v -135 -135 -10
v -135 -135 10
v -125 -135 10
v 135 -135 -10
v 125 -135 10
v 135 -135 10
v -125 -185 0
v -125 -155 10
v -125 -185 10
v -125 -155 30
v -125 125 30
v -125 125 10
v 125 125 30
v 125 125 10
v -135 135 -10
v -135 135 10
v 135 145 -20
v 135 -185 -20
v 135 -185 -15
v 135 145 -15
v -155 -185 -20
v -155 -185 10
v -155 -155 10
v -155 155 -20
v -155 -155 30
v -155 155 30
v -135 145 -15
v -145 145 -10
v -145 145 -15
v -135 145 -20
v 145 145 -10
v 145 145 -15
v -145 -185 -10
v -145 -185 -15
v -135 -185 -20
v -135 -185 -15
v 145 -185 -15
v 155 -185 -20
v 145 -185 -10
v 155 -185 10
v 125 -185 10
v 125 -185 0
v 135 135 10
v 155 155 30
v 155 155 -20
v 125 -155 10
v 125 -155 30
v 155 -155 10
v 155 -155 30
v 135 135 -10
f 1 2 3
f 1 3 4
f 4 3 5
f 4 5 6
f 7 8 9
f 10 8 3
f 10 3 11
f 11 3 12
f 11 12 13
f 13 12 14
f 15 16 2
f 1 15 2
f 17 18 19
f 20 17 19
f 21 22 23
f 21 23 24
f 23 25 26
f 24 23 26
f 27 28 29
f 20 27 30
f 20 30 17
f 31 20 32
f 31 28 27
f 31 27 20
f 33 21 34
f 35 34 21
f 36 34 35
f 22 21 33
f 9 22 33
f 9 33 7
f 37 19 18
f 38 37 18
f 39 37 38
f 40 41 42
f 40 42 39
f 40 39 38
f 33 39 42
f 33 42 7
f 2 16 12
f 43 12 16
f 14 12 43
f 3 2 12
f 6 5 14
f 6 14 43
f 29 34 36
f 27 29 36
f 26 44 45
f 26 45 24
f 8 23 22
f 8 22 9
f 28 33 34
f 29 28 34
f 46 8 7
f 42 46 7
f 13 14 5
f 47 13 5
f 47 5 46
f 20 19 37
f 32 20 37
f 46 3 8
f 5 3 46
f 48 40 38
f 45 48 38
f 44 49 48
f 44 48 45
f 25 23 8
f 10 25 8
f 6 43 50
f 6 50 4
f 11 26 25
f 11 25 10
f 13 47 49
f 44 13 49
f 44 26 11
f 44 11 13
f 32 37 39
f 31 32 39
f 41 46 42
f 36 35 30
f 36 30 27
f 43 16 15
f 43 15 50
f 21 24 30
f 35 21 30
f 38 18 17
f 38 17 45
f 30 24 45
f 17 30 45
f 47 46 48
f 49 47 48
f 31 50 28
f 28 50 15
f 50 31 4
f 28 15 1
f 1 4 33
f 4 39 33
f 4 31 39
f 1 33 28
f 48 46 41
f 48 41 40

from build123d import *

# Parameters (mm, degrees)
F1_DEPTH  = 30
F2_DEPTH  = 10
F0_W      = 250
F0_H      = 250
F0_H_2    = 30
F3_DEPTH  = 10
F6_DEPTH  = 250
F7_W      = 270
F7_H      = 270
F8_DEPTH  = 10
F9_DEPTH  = 20
F10_W     = 270
F10_H     = 5
F11_DEPTH = 330


with BuildPart() as f1:
    # F0 (on Top) → F1 (new body)
    with BuildSketch(Plane.XY):
        Polygon((125, -155), (155, -155), (155, 155), (-155, 155), (-155, -155), (-125, -155), (-125, -125), (-125, 125), (125, 125), (125, -125), align=None)
    extrude(amount=F1_DEPTH)

    # F0 (on Top) → F2 (join)
    with BuildSketch(Plane.XY):
        Polygon((155, -185), (155, -155), (125, -155), (-125, -155), (-155, -155), (-155, -185), align=None)
        Polygon((125, -155), (155, -155), (155, 155), (-155, 155), (-155, -155), (-125, -155), (-125, -125), (-125, 125), (125, 125), (125, -125), align=None)
    extrude(amount=F2_DEPTH)

    # F0 (on Top) → F3 (join)
    with BuildSketch(Plane.XY):
        Rectangle(F0_W, F0_H)
        Polygon((125, -155), (155, -155), (155, 155), (-155, 155), (-155, -155), (-125, -155), (-125, -125), (-125, 125), (125, 125), (125, -125), align=None)
        Polygon((155, -185), (155, -155), (125, -155), (-125, -155), (-155, -155), (-155, -185), align=None)
        with Locations((0, -140)):
            Rectangle(F0_W, F0_H_2)
    extrude(amount=F3_DEPTH)

    # F5 (on offset) → F6 (cut)
    with BuildSketch(Plane(origin=(-125, 0, 0), x_dir=(0, -1, 0), z_dir=(-1, 0, 0))):
        Polygon((155, 10), (185, 0), (185, 10), align=None)
    extrude(amount=-F6_DEPTH, mode=Mode.SUBTRACT)

    # F7 (on face) → F8 (cut)
    with BuildSketch(Plane(origin=(0, 0, 0), x_dir=(1, 0, 0), z_dir=(0, 0, -1))):
        Rectangle(F7_W, F7_H)
    extrude(amount=-F8_DEPTH, mode=Mode.SUBTRACT)

    # F9 (add): a face of the model
    f9_faces = [f1.faces().sort_by_distance(p)[0] for p in [
        (150.3989131719, -15, 0),
    ]]
    extrude(f9_faces, amount=F9_DEPTH)

    # F10 (on face) → F11 (cut)
    with BuildSketch(Plane.XZ.offset(185)):
        Polygon((145, -10), (-145, -10), (-145, -15), (-135, -15), (135, -15), (145, -15), align=None)
        with Locations((0, -17.5)):
            Rectangle(F10_W, F10_H)
    extrude(amount=-F11_DEPTH, mode=Mode.SUBTRACT)


solid = f1.part
